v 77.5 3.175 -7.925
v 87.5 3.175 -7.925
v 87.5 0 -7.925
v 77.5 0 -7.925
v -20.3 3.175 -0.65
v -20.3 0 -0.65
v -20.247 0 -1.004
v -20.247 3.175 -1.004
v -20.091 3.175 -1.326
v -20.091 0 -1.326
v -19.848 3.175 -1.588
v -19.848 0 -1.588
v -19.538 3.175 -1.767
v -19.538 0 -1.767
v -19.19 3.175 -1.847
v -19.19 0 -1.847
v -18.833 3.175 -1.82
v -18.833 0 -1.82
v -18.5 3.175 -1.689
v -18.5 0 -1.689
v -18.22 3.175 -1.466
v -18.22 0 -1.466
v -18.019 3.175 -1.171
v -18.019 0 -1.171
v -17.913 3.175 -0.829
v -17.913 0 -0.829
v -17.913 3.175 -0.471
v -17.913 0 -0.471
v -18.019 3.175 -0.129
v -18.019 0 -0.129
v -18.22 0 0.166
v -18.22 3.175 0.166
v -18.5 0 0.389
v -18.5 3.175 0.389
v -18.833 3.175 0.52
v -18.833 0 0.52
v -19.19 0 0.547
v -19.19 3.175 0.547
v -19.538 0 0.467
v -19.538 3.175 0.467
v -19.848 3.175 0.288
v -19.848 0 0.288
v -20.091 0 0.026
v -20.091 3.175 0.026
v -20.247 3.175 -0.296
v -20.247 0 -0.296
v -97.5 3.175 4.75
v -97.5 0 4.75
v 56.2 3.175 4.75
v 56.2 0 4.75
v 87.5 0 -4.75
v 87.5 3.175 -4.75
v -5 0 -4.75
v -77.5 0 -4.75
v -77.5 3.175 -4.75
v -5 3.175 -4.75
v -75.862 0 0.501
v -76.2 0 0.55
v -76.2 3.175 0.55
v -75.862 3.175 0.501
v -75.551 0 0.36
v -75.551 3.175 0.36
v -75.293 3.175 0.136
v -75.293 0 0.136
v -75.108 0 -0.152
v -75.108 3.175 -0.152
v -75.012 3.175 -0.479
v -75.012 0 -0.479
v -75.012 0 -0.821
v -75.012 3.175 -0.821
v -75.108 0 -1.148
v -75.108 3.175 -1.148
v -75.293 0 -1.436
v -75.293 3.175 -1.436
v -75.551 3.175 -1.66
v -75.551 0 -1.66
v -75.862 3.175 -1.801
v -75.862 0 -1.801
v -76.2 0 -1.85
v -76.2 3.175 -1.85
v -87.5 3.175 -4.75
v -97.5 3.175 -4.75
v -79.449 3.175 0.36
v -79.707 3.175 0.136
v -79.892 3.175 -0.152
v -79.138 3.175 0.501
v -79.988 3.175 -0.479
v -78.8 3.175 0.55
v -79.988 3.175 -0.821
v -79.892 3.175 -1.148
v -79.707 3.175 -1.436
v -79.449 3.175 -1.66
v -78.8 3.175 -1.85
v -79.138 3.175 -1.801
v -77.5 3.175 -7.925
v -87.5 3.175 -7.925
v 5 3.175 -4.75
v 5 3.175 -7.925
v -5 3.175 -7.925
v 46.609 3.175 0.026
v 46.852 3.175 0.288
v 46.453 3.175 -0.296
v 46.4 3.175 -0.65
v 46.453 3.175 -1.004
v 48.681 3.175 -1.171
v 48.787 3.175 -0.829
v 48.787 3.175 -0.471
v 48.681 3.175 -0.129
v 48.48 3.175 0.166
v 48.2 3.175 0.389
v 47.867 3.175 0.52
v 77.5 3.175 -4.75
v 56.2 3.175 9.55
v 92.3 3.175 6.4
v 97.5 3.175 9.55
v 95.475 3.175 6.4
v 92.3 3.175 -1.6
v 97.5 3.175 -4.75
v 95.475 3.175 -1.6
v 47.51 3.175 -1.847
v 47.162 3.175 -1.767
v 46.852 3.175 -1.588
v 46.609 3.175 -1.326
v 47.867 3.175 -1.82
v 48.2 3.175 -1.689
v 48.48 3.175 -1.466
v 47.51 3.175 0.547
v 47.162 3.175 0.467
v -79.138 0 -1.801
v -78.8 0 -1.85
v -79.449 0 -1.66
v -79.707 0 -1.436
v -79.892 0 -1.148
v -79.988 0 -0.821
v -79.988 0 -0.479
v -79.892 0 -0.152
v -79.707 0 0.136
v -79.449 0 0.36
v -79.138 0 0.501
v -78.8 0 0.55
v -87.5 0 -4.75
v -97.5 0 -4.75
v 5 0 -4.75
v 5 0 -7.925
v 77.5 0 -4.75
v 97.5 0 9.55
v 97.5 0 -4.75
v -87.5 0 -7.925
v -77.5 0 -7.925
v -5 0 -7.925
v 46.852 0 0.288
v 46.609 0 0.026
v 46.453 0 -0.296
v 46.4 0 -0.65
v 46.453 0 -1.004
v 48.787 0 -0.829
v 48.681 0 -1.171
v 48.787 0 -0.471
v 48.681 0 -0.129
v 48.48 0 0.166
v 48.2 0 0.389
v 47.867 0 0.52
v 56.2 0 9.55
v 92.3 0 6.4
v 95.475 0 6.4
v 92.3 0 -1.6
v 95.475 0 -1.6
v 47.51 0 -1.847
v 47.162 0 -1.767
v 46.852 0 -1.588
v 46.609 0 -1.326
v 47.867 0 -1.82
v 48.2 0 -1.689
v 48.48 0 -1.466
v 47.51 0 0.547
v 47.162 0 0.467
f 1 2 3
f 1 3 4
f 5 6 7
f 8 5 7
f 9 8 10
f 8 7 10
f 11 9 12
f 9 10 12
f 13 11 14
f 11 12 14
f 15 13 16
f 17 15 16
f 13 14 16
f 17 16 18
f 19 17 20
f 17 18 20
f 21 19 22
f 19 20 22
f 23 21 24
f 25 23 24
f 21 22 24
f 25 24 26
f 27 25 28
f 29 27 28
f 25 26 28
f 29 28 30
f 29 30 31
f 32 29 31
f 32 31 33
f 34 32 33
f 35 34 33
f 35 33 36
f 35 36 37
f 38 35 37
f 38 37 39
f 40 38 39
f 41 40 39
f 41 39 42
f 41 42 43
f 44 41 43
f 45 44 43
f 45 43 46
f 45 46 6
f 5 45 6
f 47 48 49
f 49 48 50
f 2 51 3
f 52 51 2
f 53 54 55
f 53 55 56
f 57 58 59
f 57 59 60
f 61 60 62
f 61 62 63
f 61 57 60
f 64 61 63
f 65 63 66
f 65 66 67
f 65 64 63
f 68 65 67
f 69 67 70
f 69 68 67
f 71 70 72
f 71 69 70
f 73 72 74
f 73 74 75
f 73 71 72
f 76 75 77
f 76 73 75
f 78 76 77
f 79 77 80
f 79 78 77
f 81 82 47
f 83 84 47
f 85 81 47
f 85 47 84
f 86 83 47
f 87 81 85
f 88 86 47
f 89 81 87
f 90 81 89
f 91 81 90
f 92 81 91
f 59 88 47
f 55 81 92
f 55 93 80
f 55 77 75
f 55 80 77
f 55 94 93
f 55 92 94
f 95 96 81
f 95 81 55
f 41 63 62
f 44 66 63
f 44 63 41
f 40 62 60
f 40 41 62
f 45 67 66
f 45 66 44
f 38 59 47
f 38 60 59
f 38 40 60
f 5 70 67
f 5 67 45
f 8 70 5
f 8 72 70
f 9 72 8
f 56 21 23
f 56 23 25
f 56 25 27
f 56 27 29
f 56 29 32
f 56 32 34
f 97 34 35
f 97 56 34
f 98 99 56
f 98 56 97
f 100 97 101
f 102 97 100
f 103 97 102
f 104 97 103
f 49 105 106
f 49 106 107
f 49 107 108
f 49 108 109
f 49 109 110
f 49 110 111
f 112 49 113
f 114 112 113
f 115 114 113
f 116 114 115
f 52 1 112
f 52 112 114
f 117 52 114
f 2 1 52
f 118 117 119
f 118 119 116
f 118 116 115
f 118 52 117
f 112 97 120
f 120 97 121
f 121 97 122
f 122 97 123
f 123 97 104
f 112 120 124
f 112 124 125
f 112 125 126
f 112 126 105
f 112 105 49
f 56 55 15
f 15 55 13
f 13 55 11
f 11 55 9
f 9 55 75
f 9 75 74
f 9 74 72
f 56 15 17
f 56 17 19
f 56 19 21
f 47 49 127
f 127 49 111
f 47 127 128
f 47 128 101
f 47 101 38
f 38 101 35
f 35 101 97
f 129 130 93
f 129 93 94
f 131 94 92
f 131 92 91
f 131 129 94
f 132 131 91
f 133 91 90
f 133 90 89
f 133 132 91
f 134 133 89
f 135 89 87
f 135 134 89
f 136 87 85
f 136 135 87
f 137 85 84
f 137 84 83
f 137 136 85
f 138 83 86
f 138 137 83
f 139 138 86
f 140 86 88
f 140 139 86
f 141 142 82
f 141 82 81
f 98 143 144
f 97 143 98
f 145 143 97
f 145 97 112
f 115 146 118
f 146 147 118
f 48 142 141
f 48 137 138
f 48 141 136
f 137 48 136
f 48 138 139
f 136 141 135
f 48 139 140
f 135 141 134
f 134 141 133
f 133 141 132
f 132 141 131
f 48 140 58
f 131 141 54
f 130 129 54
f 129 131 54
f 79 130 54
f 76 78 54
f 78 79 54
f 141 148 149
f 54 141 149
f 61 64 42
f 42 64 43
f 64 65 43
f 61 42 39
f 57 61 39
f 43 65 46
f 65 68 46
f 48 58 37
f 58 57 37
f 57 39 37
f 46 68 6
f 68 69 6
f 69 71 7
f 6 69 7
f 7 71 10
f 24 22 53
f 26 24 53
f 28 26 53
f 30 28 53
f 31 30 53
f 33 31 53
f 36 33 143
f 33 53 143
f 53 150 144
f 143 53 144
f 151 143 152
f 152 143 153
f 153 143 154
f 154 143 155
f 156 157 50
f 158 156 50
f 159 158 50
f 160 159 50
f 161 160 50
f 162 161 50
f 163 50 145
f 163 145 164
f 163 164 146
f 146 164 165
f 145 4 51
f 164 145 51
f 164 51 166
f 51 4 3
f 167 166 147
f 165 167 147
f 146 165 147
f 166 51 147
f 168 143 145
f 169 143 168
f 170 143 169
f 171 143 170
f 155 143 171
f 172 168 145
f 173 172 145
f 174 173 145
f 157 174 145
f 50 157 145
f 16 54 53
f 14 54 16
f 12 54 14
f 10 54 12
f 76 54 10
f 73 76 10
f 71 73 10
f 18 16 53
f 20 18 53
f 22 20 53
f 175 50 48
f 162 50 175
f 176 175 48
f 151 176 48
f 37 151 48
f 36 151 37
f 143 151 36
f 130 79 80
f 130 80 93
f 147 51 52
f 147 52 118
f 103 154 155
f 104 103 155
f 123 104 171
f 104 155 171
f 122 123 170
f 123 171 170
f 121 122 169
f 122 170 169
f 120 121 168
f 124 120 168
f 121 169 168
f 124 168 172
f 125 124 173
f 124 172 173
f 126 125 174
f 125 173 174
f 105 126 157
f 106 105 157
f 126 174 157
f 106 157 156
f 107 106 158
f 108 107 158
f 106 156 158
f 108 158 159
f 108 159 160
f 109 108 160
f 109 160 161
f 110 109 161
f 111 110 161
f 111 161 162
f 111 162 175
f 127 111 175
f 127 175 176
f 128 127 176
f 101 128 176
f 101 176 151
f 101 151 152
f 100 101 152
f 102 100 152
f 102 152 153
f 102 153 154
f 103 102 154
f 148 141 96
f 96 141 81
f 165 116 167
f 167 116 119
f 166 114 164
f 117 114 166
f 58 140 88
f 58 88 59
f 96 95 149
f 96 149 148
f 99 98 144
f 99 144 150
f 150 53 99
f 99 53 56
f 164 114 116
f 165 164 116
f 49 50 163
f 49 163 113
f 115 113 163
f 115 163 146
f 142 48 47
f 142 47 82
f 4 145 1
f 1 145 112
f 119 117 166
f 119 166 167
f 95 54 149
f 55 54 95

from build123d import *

# Parameters (mm, degrees)
SKETCH1_W                = 195
SKETCH1_H                = 9.5
BOSS_EXTRUDE1_DEPTH      = 3.175
M2_CLEARANCE_HOLE1_D     = 2.4
SKETCH5_W                = 10
SKETCH5_H                = 3.175
BOSS_EXTRUDE2_DEPTH      = 3.175
SKETCH6_W                = 41.3
SKETCH6_H                = 3.175
BOSS_EXTRUDE3_DEPTH      = 4.8
SKETCH7_W                = 3.175
SKETCH7_H                = 8
CUT_EXTRUDE1_DEPTH       = 99.01802449
M2_CLEARANCE_SLOT1_DEPTH = 3.175


# Read off the part's stored shape, not the designer's step: M2 Clearance Slot1
with BuildPart() as part:
    # Sketch1 → Boss-Extrude1 (new body)
    with BuildSketch(Plane(origin=(0, 0, 0), x_dir=(1, 0, 0), z_dir=(0, 1, 0))):
        Rectangle(SKETCH1_W, SKETCH1_H)
    extrude(amount=BOSS_EXTRUDE1_DEPTH)

    # M2 Clearance Hole1 (through all)
    with Locations(Plane(origin=(0, 3.175, 0), x_dir=(1, 0, 0), z_dir=(0, 1, 0))):
        with Locations((-77.5, 0.65), (47.6, 0.65), (-19.1, 0.65)):
            Hole(M2_CLEARANCE_HOLE1_D / 2)

    # Sketch5 → Boss-Extrude2 (add)
    with BuildSketch(Plane(origin=(0, 0, -4.75), x_dir=(-1, 0, 0), z_dir=(0, 0, -1))):
        with Locations((82.5, 1.5875)):
            Rectangle(SKETCH5_W, SKETCH5_H)
        with Locations((-82.5, 1.5875)):
            Rectangle(SKETCH5_W, SKETCH5_H)
        with Locations((0, 1.5875)):
            Rectangle(SKETCH5_W, SKETCH5_H)
    extrude(amount=BOSS_EXTRUDE2_DEPTH)

    # Sketch6 → Boss-Extrude3 (add)
    with BuildSketch(Plane.XY.offset(4.75)):
        with Locations((76.85, 1.5875)):
            Rectangle(SKETCH6_W, SKETCH6_H)
    extrude(amount=BOSS_EXTRUDE3_DEPTH)

    # Sketch7 → Cut-Extrude1 (cut, through all)
    with BuildSketch(Plane(origin=(0, 3.175, 0), x_dir=(1, 0, 0), z_dir=(0, 1, 0))):
        with Locations((93.8875, -2.4)):
            Rectangle(SKETCH7_W, SKETCH7_H)
    extrude(amount=-CUT_EXTRUDE1_DEPTH, mode=Mode.SUBTRACT)

    # M2 Clearance Slot1 outline → M2 Clearance Slot1 (cut)
    with BuildSketch(Plane(origin=(0, 0, 0), x_dir=(1, 0, 0), z_dir=(0, 1, 0))):
        with BuildLine():
            ThreePointArc((-78.8, 1.85), (-80, 0.65), (-78.8, -0.55))
            Line((-78.8, -0.55), (-77.5, -0.55))
            ThreePointArc((-77.5, -0.55), (-78.7, 0.65), (-77.5, 1.85))
            Line((-77.5, 1.85), (-78.8, 1.85))
        make_face()
        with BuildLine():
            ThreePointArc((-77.5, 1.85), (-76.3, 0.65), (-77.5, -0.55))
            Line((-77.5, -0.55), (-76.2, -0.55))
            ThreePointArc((-76.2, -0.55), (-75, 0.65), (-76.2, 1.85))
            Line((-76.2, 1.85), (-77.5, 1.85))
        make_face()
    extrude(amount=M2_CLEARANCE_SLOT1_DEPTH, mode=Mode.SUBTRACT)


solid = part.part
